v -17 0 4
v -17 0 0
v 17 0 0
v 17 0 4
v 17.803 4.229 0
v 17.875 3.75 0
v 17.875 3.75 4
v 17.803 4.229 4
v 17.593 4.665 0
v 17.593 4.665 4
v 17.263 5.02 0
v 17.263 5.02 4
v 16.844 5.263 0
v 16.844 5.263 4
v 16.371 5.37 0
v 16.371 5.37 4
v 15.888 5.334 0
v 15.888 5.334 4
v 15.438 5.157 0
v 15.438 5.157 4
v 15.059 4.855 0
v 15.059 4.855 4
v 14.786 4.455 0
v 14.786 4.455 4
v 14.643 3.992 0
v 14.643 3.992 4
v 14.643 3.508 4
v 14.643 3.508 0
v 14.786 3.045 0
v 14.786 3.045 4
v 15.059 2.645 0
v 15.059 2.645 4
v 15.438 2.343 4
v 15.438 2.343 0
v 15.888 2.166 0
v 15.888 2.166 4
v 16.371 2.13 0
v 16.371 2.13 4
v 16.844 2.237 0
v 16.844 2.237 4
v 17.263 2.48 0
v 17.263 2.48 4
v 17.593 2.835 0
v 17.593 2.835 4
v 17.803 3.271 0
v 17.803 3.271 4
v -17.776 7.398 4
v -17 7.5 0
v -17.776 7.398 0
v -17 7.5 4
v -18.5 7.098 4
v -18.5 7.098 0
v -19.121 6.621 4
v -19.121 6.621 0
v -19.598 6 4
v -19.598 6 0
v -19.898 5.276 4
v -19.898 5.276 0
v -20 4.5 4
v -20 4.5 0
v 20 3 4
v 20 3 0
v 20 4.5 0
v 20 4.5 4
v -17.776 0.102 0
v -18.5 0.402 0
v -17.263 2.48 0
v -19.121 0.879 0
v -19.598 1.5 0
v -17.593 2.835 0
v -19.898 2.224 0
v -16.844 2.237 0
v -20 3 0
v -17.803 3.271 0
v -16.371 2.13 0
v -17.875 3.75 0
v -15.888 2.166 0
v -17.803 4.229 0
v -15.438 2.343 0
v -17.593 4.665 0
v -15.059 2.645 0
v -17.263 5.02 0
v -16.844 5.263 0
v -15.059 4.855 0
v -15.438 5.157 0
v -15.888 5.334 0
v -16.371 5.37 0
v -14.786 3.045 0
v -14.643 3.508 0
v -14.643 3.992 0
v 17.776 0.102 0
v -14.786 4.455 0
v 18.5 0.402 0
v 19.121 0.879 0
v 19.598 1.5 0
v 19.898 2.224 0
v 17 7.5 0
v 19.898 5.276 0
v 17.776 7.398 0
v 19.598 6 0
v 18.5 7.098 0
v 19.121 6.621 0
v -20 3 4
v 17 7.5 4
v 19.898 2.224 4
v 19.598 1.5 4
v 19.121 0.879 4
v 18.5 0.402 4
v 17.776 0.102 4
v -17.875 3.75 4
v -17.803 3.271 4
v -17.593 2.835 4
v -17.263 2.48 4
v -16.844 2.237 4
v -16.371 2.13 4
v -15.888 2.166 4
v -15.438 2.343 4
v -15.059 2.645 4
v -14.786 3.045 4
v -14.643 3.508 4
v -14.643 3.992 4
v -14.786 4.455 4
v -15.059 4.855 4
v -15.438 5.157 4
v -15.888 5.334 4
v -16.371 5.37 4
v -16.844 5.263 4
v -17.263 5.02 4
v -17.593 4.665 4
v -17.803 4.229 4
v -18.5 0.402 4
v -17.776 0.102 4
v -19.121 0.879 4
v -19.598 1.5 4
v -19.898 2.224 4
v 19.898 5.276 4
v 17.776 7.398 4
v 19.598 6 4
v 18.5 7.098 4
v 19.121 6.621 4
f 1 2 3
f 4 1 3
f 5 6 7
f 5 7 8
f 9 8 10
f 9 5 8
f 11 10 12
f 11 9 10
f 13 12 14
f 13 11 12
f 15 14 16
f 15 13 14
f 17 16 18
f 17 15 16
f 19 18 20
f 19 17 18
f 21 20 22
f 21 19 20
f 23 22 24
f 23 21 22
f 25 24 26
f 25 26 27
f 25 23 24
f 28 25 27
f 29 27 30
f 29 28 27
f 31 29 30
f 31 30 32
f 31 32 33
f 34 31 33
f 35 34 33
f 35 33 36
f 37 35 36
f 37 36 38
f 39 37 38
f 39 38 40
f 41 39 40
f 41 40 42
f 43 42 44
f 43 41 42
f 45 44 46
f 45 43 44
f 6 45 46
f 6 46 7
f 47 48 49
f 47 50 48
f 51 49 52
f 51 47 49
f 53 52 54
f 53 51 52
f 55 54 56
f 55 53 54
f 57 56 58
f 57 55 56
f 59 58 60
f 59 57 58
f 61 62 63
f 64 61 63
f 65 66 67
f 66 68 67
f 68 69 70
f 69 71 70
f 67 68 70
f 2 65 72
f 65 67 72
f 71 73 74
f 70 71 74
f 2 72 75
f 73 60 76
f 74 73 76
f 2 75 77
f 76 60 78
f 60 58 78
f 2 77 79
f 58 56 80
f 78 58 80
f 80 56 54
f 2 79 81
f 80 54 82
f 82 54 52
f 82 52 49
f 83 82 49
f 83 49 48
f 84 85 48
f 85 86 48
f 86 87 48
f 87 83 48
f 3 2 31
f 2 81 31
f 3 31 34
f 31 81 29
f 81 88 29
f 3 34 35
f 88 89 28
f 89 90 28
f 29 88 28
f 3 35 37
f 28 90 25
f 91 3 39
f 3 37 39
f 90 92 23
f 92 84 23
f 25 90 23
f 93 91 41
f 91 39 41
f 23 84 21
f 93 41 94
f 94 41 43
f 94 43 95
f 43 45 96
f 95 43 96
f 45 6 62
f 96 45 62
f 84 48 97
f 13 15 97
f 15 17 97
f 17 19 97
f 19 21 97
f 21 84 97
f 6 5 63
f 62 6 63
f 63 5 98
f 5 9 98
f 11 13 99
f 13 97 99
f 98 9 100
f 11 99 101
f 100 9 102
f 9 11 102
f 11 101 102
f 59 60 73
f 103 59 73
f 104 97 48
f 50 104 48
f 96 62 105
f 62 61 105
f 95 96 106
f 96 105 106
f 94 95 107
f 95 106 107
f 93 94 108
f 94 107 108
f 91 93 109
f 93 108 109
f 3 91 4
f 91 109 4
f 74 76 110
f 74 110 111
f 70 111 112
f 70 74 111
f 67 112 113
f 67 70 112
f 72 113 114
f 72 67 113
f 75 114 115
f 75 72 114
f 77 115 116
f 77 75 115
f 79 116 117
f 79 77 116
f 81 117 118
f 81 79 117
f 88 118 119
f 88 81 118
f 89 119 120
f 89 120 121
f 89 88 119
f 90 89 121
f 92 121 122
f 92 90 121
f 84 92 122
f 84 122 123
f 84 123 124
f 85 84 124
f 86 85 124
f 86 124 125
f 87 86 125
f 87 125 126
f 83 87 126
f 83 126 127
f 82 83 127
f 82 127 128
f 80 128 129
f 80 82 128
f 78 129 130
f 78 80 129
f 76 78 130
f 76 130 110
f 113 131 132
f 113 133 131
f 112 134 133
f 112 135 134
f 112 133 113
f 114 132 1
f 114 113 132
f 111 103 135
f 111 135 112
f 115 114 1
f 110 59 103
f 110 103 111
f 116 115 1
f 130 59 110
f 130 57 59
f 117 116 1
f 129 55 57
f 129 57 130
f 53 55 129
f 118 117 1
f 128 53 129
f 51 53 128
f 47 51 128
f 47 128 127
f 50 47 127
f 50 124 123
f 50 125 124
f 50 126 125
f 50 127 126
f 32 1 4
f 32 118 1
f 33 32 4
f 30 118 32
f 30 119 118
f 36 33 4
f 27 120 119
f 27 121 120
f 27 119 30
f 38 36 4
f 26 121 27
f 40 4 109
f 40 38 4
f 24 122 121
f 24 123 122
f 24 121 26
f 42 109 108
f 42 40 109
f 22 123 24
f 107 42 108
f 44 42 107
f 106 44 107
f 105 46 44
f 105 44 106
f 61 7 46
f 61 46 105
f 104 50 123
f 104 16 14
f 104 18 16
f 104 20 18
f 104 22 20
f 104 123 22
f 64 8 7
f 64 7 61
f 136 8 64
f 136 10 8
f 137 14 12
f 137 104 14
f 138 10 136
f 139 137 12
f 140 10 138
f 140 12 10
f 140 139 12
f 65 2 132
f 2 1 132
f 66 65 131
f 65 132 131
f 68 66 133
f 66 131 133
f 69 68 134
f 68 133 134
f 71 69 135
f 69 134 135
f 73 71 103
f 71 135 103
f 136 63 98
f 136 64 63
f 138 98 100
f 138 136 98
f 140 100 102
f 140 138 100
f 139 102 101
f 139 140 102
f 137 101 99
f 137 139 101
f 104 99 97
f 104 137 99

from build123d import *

# Parameters (mm, degrees)
SKETCH2_R           = 1.625
BOSS_EXTRUDE1_DEPTH = 4
FILLET1_R           = 3


with BuildPart() as part:
    # Sketch2 → Boss-Extrude1 (new body)
    with BuildSketch(Plane.XY):
        Polygon((0, 0), (20, 0), (20, 7.5), (-20, 7.5), (-20, 0), align=None)
        with Locations((16.25, 3.75)):
            Circle(SKETCH2_R, mode=Mode.SUBTRACT)
        with Locations(Location((-16.25, 3.75, 0), (0, 0, 180))):
            Circle(SKETCH2_R, mode=Mode.SUBTRACT)
    extrude(amount=BOSS_EXTRUDE1_DEPTH)

    # Fillet1
    fillet1_edges = [part.edges().sort_by_distance(p)[0] for p in [
        (-20, 0, 2),
        (-20, 7.5, 2),
        (20, 7.5, 2),
        (20, 0, 2),
    ]]
    fillet(fillet1_edges, radius=FILLET1_R)


solid = part.part
